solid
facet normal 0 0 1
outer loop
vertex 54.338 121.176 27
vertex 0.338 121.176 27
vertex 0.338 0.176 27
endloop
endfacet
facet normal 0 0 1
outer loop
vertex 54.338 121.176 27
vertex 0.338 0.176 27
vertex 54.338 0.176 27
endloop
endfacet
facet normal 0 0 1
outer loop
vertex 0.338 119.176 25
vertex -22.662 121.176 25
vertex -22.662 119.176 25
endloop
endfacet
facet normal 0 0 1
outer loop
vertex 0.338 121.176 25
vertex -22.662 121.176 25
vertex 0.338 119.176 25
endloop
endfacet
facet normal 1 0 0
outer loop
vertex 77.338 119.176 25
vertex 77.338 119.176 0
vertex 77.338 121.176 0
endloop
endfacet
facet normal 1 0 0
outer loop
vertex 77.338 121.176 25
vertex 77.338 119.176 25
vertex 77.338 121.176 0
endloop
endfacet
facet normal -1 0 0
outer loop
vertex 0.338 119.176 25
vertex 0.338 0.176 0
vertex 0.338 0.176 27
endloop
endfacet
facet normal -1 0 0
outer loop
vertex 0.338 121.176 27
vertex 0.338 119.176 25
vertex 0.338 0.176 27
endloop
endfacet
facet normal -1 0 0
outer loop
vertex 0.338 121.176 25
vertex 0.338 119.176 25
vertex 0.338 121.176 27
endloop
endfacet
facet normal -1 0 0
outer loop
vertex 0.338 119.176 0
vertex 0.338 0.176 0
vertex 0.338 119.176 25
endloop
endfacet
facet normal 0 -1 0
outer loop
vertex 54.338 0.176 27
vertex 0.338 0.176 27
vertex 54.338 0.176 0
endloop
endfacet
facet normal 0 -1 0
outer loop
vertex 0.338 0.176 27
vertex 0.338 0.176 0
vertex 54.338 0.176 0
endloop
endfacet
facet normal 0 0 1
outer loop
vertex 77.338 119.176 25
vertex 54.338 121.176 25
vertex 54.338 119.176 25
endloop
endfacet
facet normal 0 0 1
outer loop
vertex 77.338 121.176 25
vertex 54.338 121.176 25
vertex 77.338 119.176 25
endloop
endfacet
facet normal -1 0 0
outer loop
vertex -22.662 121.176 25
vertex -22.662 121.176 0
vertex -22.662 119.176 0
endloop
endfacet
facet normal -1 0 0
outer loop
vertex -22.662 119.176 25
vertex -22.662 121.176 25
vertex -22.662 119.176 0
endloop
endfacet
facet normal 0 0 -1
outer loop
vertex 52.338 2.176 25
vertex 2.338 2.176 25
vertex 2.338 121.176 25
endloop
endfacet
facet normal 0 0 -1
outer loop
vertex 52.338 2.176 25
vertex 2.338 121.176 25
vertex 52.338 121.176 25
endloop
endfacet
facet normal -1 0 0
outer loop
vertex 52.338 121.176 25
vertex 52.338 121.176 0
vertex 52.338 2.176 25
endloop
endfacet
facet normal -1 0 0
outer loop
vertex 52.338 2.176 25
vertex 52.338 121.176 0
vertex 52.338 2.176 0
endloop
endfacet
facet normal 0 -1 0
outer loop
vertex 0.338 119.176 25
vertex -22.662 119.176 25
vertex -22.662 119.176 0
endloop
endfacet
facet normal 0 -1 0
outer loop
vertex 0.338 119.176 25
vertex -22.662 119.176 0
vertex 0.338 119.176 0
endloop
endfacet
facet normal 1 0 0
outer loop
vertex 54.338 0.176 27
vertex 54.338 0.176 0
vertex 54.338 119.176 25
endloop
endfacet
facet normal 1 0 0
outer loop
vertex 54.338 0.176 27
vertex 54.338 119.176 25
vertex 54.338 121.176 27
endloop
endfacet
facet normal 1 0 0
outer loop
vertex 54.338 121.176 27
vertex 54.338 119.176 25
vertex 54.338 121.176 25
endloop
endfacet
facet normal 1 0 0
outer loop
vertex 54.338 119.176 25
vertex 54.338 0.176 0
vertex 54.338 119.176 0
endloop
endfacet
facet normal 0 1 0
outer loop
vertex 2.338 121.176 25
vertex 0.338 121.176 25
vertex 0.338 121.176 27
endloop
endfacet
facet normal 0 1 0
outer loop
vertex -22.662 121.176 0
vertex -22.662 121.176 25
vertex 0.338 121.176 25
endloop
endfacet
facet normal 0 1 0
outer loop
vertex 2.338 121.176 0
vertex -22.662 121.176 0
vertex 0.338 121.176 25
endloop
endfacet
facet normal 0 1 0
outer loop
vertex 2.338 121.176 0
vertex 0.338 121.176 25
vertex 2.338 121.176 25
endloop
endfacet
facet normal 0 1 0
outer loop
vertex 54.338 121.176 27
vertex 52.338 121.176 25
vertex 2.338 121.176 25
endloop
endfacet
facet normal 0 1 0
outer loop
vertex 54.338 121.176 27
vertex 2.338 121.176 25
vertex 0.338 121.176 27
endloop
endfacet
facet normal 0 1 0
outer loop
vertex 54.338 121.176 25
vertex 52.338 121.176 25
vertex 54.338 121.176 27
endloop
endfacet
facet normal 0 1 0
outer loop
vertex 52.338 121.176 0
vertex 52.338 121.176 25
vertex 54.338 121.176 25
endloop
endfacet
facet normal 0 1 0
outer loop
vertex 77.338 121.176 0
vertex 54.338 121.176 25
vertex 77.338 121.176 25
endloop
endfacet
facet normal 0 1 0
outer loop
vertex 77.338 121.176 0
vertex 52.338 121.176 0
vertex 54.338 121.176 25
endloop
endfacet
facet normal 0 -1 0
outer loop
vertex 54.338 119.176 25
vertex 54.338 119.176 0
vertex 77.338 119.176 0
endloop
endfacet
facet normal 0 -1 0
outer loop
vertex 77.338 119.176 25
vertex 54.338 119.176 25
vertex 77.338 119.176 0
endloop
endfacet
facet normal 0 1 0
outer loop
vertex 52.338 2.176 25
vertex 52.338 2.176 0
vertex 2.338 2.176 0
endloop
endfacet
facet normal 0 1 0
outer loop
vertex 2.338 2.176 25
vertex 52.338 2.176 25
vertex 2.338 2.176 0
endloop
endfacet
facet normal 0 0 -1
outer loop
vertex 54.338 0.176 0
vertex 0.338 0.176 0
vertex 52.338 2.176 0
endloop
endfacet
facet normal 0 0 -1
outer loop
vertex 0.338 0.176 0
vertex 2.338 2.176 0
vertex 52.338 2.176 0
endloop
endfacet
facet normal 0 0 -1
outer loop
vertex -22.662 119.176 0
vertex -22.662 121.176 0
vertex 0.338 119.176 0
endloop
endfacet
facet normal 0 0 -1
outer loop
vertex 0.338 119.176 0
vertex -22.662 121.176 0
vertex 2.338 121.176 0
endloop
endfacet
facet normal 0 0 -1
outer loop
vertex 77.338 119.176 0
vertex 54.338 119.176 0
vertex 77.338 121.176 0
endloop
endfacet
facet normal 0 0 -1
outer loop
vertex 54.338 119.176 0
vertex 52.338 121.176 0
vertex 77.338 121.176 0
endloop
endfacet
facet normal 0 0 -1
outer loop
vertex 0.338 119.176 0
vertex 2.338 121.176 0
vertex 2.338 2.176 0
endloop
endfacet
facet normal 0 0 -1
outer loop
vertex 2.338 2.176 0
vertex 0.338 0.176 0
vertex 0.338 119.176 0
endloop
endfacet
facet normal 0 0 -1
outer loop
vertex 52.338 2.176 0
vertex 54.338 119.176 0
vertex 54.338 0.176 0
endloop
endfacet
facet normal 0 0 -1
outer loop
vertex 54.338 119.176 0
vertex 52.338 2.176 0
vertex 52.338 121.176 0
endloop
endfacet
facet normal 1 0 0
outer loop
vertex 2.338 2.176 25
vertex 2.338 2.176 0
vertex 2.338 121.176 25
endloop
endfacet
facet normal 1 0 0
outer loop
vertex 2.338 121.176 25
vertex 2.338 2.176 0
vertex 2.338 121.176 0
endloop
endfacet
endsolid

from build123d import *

# Parameters (mm, degrees)
BOSS_EXTRUDE1_DEPTH = 25
SKETCH3_W           = 54
SKETCH3_H           = 121
BOSS_EXTRUDE2_DEPTH = 2


with BuildPart() as part:
    # Sketch1 → Boss-Extrude1 (new body)
    with BuildSketch(Plane.XY):
        Polygon((2.337959557, 2.176185102), (2.337959557, 121.176185102), (-22.662040443, 121.176185102), (-22.662040443, 119.176185102), (0.337959557, 119.176185102), (0.337959557, 0.176185102), (54.337959557, 0.176185102), (54.337959557, 119.176185102), (77.337959557, 119.176185102), (77.337959557, 121.176185102), (52.337959557, 121.176185102), (52.337959557, 2.176185102), align=None)
    extrude(amount=BOSS_EXTRUDE1_DEPTH)

    # Sketch3 → Boss-Extrude2 (add)
    with BuildSketch(Plane.XY.offset(25)):
        with Locations((27.337959557, 60.676185102)):
            Rectangle(SKETCH3_W, SKETCH3_H)
    extrude(amount=BOSS_EXTRUDE2_DEPTH)


solid = part.part
